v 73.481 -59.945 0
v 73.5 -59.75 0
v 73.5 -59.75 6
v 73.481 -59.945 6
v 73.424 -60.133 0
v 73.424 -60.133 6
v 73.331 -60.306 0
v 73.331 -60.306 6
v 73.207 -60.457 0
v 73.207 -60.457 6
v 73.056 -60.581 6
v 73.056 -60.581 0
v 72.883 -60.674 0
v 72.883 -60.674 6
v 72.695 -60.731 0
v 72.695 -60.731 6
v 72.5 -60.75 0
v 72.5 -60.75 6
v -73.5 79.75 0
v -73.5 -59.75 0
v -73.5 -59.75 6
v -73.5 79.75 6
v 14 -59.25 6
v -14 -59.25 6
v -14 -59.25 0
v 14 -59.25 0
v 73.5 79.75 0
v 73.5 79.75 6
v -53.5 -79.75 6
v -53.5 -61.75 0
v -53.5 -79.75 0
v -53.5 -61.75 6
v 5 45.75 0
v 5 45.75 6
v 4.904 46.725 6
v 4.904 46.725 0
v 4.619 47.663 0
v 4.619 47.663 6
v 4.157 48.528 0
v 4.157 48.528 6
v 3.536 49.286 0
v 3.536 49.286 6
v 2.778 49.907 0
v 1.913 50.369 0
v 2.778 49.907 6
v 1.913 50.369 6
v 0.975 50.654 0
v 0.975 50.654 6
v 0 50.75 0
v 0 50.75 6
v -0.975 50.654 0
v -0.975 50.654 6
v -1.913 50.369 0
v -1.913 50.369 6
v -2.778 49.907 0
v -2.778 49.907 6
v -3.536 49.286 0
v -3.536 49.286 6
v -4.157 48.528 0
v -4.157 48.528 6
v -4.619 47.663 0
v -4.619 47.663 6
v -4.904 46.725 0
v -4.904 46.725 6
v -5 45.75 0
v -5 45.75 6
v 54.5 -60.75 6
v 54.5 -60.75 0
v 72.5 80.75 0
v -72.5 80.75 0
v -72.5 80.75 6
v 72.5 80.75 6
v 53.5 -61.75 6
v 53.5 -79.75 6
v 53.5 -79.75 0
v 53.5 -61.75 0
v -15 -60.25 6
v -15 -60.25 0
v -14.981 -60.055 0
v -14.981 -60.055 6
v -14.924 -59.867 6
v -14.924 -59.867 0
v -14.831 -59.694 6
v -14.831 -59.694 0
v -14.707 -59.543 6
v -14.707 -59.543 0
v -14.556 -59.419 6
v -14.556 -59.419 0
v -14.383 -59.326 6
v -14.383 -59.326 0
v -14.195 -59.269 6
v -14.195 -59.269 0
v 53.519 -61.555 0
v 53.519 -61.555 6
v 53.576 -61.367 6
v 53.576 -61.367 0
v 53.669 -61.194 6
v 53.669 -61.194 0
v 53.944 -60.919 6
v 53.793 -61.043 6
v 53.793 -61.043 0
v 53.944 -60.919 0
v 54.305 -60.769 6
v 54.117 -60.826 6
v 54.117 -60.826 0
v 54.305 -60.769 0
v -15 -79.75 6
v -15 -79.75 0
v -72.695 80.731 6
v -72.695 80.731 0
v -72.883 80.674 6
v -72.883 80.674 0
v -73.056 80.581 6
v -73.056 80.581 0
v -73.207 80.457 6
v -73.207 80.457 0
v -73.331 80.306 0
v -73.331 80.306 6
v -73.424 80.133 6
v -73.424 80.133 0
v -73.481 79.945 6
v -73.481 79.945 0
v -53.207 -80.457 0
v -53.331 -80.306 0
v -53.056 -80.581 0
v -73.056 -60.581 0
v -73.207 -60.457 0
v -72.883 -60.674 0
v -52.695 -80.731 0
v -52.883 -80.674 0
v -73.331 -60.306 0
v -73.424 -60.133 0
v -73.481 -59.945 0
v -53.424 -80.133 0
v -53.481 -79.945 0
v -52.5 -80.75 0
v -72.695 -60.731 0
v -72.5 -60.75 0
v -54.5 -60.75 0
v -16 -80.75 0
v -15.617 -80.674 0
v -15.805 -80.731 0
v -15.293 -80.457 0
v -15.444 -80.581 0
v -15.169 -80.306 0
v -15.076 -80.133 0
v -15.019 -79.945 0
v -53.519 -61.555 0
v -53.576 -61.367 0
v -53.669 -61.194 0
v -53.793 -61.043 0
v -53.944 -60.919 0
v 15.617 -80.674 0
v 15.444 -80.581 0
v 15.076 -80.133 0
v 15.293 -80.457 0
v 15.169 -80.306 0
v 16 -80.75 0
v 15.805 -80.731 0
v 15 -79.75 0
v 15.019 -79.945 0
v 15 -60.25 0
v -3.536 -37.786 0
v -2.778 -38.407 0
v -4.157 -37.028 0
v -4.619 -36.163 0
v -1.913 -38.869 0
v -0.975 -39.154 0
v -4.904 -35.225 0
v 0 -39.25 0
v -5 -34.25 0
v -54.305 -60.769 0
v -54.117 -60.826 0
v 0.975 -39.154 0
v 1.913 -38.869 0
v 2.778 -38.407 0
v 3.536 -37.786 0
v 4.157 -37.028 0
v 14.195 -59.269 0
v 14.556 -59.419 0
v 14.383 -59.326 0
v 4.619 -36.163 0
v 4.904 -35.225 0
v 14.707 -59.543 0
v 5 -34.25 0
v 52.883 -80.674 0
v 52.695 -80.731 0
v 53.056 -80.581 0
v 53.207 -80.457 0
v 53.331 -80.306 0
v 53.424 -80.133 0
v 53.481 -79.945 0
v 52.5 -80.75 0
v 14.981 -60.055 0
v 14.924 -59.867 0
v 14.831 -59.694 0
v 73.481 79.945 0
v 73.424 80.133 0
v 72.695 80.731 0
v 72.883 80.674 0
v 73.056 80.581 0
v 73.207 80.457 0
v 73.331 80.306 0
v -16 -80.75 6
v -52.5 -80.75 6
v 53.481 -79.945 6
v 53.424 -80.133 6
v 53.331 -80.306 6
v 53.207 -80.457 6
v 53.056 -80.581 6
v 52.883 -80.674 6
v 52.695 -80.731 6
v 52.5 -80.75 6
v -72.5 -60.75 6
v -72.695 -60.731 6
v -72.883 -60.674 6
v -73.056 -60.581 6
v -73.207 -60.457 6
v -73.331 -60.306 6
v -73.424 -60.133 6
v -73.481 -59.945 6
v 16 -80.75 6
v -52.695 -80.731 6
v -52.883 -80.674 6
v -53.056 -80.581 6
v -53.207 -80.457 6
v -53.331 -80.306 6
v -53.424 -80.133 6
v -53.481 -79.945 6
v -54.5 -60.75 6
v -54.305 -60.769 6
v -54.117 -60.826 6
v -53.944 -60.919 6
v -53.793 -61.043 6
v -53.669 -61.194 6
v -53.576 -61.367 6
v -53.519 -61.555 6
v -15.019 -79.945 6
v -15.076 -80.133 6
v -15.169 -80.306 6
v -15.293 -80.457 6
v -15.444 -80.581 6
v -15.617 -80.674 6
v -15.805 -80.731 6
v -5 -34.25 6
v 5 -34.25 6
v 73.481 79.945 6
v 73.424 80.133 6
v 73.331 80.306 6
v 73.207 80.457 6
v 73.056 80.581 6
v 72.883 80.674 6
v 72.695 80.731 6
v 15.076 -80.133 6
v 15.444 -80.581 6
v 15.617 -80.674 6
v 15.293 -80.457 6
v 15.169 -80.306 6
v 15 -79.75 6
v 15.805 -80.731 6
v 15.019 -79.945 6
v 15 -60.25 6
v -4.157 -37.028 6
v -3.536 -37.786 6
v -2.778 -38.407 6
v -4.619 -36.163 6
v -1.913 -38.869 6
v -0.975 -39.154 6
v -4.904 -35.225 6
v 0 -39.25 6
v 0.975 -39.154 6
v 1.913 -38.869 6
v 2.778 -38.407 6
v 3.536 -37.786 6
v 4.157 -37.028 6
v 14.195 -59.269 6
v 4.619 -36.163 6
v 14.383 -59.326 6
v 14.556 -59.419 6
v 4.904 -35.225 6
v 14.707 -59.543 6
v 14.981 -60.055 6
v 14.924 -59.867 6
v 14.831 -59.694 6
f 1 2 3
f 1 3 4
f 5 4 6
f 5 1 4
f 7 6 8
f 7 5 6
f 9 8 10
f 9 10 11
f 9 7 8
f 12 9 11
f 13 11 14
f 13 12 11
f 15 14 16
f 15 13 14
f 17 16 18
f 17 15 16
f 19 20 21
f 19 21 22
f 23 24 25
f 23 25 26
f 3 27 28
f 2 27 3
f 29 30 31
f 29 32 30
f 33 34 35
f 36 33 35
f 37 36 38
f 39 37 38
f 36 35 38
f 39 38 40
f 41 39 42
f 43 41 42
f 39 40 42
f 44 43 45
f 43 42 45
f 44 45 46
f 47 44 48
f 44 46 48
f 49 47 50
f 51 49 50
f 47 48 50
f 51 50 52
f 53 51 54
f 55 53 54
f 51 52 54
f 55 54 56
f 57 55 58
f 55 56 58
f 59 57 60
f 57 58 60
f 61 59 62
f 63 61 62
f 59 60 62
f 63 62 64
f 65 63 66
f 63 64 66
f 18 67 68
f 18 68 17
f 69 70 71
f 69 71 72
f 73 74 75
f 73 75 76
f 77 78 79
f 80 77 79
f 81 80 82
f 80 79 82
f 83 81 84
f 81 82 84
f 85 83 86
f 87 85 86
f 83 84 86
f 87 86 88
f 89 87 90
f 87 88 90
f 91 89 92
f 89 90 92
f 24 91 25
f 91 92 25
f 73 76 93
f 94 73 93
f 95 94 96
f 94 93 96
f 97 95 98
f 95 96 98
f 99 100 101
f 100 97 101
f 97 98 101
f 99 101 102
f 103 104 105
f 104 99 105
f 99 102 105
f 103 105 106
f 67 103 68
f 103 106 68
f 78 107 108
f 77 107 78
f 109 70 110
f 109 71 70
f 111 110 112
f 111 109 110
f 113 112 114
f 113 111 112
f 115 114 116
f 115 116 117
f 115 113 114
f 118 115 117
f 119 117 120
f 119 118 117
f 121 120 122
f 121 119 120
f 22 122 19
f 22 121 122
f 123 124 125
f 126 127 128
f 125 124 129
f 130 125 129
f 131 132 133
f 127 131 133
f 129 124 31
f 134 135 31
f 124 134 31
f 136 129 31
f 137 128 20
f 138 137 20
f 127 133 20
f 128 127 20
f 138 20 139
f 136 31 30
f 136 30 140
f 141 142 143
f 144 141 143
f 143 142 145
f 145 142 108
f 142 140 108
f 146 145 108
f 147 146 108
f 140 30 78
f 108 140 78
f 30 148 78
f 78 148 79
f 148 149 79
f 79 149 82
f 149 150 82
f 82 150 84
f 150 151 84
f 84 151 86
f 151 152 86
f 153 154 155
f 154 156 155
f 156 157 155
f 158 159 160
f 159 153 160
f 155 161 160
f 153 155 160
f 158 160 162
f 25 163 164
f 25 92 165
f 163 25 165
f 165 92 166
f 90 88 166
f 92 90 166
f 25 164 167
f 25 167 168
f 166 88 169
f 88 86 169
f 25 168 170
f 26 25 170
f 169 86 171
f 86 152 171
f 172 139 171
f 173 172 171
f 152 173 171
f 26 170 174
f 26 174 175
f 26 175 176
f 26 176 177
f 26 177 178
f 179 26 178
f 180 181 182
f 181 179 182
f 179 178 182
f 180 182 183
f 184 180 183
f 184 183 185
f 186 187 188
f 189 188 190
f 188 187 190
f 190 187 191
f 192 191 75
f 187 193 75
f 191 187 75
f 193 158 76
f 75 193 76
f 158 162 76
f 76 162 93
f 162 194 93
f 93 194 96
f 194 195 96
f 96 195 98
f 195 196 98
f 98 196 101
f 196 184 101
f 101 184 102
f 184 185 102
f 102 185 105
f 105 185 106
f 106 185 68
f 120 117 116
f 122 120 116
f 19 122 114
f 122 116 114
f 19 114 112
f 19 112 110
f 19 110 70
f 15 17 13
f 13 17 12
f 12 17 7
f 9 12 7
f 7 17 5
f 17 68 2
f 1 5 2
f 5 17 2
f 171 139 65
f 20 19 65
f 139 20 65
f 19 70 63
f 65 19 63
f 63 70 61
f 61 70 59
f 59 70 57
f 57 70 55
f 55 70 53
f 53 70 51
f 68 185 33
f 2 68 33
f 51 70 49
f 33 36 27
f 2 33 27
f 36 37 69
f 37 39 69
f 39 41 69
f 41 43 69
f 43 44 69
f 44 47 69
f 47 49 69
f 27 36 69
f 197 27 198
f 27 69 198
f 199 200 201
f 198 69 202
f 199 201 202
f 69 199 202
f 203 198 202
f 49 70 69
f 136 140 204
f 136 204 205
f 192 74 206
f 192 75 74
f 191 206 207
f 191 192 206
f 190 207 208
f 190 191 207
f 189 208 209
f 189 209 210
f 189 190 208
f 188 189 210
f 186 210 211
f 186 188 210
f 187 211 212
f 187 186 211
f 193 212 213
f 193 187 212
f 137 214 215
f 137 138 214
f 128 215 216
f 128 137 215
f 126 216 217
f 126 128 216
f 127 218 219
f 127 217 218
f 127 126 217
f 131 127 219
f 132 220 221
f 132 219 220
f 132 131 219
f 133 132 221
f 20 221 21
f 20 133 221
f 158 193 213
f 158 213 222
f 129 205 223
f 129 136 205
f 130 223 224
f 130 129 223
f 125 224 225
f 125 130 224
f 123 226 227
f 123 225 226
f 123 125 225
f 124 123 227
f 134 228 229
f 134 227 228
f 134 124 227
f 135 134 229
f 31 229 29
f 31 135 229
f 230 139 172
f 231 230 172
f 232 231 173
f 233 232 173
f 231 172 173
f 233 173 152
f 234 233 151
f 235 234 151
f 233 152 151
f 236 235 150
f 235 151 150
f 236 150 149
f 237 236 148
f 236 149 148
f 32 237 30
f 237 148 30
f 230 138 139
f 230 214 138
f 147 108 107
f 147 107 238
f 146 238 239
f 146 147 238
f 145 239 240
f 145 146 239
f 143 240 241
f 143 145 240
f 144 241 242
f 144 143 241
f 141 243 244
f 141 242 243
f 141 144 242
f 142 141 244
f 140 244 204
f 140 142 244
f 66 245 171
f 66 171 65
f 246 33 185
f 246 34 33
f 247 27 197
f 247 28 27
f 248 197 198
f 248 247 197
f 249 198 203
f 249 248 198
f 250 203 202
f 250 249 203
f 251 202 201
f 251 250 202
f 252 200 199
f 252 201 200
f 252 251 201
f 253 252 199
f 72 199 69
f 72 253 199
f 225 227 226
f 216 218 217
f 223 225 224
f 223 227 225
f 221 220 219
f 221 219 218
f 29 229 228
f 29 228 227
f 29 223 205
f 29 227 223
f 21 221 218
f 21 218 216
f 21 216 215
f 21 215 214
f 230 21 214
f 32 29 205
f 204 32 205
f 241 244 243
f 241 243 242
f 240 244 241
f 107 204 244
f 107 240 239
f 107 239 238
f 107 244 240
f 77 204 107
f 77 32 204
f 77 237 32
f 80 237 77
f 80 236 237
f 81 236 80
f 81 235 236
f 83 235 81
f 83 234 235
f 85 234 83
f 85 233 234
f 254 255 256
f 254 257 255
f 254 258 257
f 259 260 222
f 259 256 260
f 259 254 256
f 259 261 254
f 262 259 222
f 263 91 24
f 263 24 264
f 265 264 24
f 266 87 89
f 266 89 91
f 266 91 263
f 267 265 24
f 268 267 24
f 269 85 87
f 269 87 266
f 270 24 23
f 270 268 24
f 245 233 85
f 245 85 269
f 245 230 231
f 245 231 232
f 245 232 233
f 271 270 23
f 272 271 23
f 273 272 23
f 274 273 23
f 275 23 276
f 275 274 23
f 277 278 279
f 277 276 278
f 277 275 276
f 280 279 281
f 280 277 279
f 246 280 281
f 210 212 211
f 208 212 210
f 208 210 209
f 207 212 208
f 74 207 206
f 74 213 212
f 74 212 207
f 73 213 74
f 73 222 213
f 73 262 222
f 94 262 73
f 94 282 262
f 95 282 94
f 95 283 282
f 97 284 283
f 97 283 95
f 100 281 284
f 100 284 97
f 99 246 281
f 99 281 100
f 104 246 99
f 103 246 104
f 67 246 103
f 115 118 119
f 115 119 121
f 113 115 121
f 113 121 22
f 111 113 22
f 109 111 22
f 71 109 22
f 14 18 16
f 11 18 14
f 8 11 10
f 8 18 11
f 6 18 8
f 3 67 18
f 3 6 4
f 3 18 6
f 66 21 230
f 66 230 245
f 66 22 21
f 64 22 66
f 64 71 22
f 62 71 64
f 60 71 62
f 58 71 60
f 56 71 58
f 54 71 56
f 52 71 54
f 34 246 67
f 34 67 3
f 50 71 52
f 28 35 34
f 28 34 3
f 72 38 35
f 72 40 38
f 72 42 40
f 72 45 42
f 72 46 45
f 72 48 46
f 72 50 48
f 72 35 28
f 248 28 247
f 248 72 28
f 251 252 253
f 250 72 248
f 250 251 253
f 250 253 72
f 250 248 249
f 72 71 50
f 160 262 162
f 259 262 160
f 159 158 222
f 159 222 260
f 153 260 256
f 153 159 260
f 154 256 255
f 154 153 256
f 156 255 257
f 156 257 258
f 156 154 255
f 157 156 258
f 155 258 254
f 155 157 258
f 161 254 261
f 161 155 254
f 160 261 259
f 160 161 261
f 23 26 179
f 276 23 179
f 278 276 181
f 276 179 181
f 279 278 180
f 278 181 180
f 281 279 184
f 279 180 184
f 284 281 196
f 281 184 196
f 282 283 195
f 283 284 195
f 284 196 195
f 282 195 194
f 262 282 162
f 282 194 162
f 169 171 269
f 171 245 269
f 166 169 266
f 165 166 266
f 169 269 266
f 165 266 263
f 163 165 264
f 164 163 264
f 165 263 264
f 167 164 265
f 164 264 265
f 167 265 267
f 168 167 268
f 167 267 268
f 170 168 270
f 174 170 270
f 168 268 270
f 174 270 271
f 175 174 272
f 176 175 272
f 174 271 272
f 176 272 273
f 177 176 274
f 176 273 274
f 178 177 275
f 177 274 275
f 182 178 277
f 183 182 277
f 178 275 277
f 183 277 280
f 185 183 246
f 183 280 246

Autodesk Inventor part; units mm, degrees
sketch "Sketch1" plane through (0, 0, 0) normal (0, 0, 1) x (1, 0, 0)
  line L0 (-73.5, 80.75) -> (73.5, 80.75)
  line L1 (73.5, 80.75) -> (73.5, -80.75)
  line L2 (73.5, -80.75) -> (-73.5, -80.75)
  line L3 (-73.5, -80.75) -> (-73.5, 80.75)
  point P0 (0, 80.75)
  point P1 (0, 0)
  point P2 (-73.5, 0)
  dimension "d0" = 147
  dimension "d1" = 161.5
extrude "Extrusion1" add sketch "Sketch1" along normal blind 6
sketch "Sketch2" plane through (0, 0, 6) normal (0, 0, 1) x (1, 0, 0)
  line L0 (-73.5, 80.75) -> (-73.5, -80.75) projected
  line L1 (-73.5, -80.75) -> (-73.5, -60.75)
  line L2 (-53.5, -80.75) -> (-73.5, -80.75)
  line L3 (-73.5, -60.75) -> (-53.5, -60.75)
  line L4 (-53.5, -60.75) -> (-53.5, -80.75)
  line L5 (-73.5, -80.75) -> (73.5, -80.75) projected
  line L6 (-53.5, -80.75) -> (-73.5, -80.75)
  point P0 (0, 0)
  point P1 (40.5, -62.5)
  dimension "d14" = 20
  dimension "d18" = 20
extrude "Extrusion2" cut sketch "Sketch2" against normal blind 15
mirror "Mirror1" about plane through (0, 0, 0) normal (1, 0, 0) of "Extrusion2"
sketch "Sketch5" plane through (0, 0, 6) normal (0, 0, 1) x (1, 0, 0)
  line L0 (-15, -59.25) -> (15, -59.25)
  line L1 (15, -59.25) -> (15, -80.75)
  line L2 (15, -80.75) -> (-15, -80.75)
  line L3 (-15, -80.75) -> (-15, -59.25)
  line L4 (-53.5, -80.75) -> (53.5, -80.75) projected
  point P0 (0, 0)
  point P1 (0, -80.75)
  point P2 (0, -80.75)
  point P3 (0, -80.75)
  dimension "d19" = 30
  dimension "d20" = 21.5
extrude "Extrusion4" cut sketch "Sketch5" against normal blind 6
sketch "Sketch3" plane through (0, 0, 6) normal (0, 0, 1) x (1, 0, 0)
  line L0 (-73.5, -80.75) -> (73.5, -80.75) projected
  line L1 (-15, -59.25) -> (15, -59.25) projected
  line L2 (0, -80.75) -> (0, -69.25) construction
  line L3 (0, -69.25) -> (0, -44.25) construction
  line L4 (0, -44.25) -> (0, -34.25) construction
  line L5 (-5, 45.75) -> (5, 45.75) construction
  line L6 (5, 45.75) -> (5, -34.25)
  line L7 (5, -34.25) -> (-5, -34.25) construction
  line L8 (-5, -34.25) -> (-5, 45.75)
  arc A0 (-5, -34.25) -> (5, -34.25) centre (0, -34.25) ccw
  arc A1 (5, 45.75) -> (-5, 45.75) centre (0, 45.75) ccw
  line L9 (73.5, 80.75) -> (-73.5, 80.75) projected
  line L10 (0, 80.75) -> (0, 55.75) construction
  line L11 (0, 55.75) -> (0, 45.75) construction
  point P0 (0, 0)
  point P1 (-40.5, -62.5)
  point P2 (40.5, -62.5)
  point P3 (73.5, -80.75)
  dimension "d23" = 11.5
  dimension "d24" = 25
  dimension "d26" = 10
  dimension "d27" = 10
  dimension "d29" = 25
  dimension "d30" = 10
extrude "Extrusion3" cut sketch "Sketch3" against normal blind 6
fillet "Fillet1" radius 1 12 edges at (-73.5, 80.75, 3) (73.5, 80.75, 3) (73.5, -60.75, 3) (53.5, -60.75, 3) (53.5, -80.75, 3) (15, -80.75, 3) (15, -59.25, 3) (-15, -59.25, 3) (-15, -80.75, 3) (-53.5, -80.75, 3) (-73.5, -60.75, 3) (-53.5, -60.75, 3)
equation "\"d7\" = d5"
equation "\"d5\" = 15"
properties part number "Hammer_wall" material "MDF Medium Density Fiberboard"
